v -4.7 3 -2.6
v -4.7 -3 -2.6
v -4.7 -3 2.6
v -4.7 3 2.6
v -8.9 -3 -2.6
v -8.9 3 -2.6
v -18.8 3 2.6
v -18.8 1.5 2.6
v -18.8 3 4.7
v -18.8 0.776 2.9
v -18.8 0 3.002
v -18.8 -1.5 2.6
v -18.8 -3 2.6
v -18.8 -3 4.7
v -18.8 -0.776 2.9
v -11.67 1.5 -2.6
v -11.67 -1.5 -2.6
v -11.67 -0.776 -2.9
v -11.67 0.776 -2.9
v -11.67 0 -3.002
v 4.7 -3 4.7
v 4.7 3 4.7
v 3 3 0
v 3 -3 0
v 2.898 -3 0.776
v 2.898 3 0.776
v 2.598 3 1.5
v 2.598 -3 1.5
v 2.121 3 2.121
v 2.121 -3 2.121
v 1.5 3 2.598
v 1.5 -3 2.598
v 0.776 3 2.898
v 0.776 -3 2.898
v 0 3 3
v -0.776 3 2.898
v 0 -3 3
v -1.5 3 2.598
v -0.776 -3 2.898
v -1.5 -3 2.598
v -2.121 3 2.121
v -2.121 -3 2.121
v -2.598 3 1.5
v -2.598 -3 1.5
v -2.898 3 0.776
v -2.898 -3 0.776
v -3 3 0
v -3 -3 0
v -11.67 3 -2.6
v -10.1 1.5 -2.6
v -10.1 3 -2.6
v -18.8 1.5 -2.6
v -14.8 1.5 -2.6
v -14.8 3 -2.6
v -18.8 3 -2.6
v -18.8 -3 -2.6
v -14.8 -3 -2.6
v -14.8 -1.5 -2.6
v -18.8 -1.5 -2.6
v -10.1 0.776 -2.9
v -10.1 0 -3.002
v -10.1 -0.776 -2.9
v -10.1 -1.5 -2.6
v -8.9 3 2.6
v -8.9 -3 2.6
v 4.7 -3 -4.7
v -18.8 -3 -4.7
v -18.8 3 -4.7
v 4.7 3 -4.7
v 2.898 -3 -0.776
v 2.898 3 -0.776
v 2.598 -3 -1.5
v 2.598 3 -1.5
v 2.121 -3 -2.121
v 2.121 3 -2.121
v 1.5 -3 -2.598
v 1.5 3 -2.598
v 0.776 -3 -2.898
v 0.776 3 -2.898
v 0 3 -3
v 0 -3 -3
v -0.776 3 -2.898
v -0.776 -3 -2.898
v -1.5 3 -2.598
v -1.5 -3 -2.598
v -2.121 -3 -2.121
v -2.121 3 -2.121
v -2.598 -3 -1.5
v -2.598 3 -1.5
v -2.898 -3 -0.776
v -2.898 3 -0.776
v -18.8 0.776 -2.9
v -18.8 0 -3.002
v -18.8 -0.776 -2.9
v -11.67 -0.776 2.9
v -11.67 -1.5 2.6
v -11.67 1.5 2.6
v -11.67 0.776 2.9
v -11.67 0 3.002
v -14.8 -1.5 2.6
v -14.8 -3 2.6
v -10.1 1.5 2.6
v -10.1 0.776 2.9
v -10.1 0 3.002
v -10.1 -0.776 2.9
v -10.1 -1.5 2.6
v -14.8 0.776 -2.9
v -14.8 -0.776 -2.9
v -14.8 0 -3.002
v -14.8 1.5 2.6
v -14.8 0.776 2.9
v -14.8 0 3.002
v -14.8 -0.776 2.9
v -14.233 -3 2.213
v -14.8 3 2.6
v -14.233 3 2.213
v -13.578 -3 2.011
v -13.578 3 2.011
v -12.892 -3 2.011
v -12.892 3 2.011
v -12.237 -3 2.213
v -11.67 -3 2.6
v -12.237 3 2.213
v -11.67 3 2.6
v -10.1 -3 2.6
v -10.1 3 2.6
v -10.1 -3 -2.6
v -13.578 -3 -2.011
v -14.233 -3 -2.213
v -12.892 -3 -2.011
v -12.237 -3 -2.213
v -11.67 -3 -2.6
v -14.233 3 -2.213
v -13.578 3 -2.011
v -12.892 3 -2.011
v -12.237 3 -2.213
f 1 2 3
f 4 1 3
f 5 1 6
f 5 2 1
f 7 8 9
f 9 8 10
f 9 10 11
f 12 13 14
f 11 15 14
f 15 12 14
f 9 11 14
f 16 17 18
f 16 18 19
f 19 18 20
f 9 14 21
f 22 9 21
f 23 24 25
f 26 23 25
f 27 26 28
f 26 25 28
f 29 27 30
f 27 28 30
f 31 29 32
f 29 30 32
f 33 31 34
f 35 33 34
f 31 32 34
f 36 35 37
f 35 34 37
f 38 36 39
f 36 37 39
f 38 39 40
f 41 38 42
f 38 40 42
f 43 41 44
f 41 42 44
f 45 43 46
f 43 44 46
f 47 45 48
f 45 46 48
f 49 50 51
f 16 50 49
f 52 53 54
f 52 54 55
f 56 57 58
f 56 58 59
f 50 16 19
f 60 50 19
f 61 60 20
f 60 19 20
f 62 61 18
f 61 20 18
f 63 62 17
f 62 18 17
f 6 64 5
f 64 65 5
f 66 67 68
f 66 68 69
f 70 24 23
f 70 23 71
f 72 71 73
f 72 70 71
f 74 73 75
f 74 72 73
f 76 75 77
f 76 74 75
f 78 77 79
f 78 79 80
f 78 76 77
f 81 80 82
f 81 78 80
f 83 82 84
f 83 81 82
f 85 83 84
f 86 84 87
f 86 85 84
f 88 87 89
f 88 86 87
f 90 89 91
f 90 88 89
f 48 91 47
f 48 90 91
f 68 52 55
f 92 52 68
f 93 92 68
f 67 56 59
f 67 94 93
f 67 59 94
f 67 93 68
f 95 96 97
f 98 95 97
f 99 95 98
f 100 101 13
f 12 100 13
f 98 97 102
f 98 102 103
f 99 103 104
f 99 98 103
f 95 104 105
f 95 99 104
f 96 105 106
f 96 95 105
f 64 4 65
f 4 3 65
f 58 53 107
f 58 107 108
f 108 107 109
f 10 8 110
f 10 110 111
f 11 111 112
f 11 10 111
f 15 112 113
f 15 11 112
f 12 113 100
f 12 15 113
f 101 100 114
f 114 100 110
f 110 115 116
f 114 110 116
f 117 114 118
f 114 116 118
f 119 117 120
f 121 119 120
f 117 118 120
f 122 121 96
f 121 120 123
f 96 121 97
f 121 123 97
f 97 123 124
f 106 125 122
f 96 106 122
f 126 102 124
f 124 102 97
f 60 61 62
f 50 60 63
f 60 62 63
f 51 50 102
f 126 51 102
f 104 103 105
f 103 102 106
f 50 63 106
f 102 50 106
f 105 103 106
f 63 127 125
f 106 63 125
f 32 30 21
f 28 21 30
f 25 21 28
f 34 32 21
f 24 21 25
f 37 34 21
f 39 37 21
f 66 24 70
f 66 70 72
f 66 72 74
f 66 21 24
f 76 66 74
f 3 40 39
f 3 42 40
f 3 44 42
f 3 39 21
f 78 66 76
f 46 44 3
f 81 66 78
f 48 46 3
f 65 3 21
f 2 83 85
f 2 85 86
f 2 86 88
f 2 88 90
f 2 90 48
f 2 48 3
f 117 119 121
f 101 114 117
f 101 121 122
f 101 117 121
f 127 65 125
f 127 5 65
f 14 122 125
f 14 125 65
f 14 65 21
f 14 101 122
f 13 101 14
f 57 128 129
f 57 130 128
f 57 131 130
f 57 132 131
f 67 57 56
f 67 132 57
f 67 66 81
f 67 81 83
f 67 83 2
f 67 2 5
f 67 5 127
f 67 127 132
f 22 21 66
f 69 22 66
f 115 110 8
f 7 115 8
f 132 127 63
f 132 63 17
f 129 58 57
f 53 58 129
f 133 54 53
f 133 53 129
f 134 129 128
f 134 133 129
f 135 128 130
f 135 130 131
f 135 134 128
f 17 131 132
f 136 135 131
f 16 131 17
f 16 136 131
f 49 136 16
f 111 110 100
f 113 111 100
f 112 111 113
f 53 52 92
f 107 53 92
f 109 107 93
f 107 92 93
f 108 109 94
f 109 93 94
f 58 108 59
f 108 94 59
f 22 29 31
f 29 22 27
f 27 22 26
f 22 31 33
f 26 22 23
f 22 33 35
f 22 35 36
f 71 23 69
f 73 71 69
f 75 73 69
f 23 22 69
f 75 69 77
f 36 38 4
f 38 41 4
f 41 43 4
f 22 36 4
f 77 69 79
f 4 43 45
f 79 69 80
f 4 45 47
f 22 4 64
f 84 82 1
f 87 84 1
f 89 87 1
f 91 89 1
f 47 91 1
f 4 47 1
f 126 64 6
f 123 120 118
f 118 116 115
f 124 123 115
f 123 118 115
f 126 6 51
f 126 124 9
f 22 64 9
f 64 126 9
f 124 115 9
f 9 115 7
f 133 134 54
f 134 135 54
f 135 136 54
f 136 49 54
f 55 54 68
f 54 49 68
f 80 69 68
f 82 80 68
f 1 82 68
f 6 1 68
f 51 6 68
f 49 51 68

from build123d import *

# Parameters (mm, degrees)
F1_DEPTH = 3
F3_DEPTH = 8.7
F5_DEPTH = 6


with BuildPart() as f1:
    # F0 (on Front) → F1 (new body, symmetric)
    with BuildSketch(Plane.XZ):
        with BuildLine():
            Line((-8.9, 0), (-10.1, 0))
            Line((-10.1, 0), (-10.1, -2.6))
            Line((-10.1, -2.6), (-11.67, -2.6))
            Line((-11.67, -2.6), (-14.8, -2.6))
            Line((-14.8, -2.6), (-18.8, -2.6))
            Line((-18.8, -2.6), (-18.8, -4.7))
            Line((-18.8, -4.7), (0, -4.7))
            Line((0, -4.7), (4.7, -4.7))
            Line((4.7, -4.7), (4.7, 0))
            Line((4.7, 0), (3, 0))
            ThreePointArc((3, 0), (2.1213203436, -2.1213203436), (0, -3))
            ThreePointArc((0, -3), (-2.1213203436, -2.1213203436), (-3, 0))
            Line((-3, 0), (-4.7, 0))
            Line((-4.7, 0), (-4.7, -2.6))
            Line((-4.7, -2.6), (-8.9, -2.6))
            Line((-8.9, -2.6), (-8.9, 0))
        make_face()
    extrude(amount=F1_DEPTH, both=True)

    # F2 (on face) → F3 (cut, through all)
    with BuildSketch(Plane(origin=(-18.8, 0, 0), x_dir=(0, -1, 0), z_dir=(-1, 0, 0))):
        with BuildLine():
            Line((1.5, -2.6), (-1.5, -2.6))
            ThreePointArc((-1.5, -2.6), (0, -3.0019237886), (1.5, -2.6))
        make_face()
    extrude(amount=-F3_DEPTH, mode=Mode.SUBTRACT)

    # F4 (on face) → F5 (join, through all)
    with BuildSketch(Plane(origin=(0, 3, 0), x_dir=(-1, 0, 0), z_dir=(0, 1, 0))):
        with BuildLine():
            ThreePointArc((14.8, -2.6), (13.235, -1.9854598779), (11.67, -2.6))
            Line((11.67, -2.6), (11.67, -4.7))
            Line((11.67, -4.7), (14.8, -4.7))
            Line((14.8, -4.7), (14.8, -2.6))
        make_face()
    extrude(amount=-F5_DEPTH)

    # F6: F1 across plane


with BuildPart() as f1_1:
    add(f1.part)
    add(f1.part.mirror(Plane.XY))


solid = f1_1.part
